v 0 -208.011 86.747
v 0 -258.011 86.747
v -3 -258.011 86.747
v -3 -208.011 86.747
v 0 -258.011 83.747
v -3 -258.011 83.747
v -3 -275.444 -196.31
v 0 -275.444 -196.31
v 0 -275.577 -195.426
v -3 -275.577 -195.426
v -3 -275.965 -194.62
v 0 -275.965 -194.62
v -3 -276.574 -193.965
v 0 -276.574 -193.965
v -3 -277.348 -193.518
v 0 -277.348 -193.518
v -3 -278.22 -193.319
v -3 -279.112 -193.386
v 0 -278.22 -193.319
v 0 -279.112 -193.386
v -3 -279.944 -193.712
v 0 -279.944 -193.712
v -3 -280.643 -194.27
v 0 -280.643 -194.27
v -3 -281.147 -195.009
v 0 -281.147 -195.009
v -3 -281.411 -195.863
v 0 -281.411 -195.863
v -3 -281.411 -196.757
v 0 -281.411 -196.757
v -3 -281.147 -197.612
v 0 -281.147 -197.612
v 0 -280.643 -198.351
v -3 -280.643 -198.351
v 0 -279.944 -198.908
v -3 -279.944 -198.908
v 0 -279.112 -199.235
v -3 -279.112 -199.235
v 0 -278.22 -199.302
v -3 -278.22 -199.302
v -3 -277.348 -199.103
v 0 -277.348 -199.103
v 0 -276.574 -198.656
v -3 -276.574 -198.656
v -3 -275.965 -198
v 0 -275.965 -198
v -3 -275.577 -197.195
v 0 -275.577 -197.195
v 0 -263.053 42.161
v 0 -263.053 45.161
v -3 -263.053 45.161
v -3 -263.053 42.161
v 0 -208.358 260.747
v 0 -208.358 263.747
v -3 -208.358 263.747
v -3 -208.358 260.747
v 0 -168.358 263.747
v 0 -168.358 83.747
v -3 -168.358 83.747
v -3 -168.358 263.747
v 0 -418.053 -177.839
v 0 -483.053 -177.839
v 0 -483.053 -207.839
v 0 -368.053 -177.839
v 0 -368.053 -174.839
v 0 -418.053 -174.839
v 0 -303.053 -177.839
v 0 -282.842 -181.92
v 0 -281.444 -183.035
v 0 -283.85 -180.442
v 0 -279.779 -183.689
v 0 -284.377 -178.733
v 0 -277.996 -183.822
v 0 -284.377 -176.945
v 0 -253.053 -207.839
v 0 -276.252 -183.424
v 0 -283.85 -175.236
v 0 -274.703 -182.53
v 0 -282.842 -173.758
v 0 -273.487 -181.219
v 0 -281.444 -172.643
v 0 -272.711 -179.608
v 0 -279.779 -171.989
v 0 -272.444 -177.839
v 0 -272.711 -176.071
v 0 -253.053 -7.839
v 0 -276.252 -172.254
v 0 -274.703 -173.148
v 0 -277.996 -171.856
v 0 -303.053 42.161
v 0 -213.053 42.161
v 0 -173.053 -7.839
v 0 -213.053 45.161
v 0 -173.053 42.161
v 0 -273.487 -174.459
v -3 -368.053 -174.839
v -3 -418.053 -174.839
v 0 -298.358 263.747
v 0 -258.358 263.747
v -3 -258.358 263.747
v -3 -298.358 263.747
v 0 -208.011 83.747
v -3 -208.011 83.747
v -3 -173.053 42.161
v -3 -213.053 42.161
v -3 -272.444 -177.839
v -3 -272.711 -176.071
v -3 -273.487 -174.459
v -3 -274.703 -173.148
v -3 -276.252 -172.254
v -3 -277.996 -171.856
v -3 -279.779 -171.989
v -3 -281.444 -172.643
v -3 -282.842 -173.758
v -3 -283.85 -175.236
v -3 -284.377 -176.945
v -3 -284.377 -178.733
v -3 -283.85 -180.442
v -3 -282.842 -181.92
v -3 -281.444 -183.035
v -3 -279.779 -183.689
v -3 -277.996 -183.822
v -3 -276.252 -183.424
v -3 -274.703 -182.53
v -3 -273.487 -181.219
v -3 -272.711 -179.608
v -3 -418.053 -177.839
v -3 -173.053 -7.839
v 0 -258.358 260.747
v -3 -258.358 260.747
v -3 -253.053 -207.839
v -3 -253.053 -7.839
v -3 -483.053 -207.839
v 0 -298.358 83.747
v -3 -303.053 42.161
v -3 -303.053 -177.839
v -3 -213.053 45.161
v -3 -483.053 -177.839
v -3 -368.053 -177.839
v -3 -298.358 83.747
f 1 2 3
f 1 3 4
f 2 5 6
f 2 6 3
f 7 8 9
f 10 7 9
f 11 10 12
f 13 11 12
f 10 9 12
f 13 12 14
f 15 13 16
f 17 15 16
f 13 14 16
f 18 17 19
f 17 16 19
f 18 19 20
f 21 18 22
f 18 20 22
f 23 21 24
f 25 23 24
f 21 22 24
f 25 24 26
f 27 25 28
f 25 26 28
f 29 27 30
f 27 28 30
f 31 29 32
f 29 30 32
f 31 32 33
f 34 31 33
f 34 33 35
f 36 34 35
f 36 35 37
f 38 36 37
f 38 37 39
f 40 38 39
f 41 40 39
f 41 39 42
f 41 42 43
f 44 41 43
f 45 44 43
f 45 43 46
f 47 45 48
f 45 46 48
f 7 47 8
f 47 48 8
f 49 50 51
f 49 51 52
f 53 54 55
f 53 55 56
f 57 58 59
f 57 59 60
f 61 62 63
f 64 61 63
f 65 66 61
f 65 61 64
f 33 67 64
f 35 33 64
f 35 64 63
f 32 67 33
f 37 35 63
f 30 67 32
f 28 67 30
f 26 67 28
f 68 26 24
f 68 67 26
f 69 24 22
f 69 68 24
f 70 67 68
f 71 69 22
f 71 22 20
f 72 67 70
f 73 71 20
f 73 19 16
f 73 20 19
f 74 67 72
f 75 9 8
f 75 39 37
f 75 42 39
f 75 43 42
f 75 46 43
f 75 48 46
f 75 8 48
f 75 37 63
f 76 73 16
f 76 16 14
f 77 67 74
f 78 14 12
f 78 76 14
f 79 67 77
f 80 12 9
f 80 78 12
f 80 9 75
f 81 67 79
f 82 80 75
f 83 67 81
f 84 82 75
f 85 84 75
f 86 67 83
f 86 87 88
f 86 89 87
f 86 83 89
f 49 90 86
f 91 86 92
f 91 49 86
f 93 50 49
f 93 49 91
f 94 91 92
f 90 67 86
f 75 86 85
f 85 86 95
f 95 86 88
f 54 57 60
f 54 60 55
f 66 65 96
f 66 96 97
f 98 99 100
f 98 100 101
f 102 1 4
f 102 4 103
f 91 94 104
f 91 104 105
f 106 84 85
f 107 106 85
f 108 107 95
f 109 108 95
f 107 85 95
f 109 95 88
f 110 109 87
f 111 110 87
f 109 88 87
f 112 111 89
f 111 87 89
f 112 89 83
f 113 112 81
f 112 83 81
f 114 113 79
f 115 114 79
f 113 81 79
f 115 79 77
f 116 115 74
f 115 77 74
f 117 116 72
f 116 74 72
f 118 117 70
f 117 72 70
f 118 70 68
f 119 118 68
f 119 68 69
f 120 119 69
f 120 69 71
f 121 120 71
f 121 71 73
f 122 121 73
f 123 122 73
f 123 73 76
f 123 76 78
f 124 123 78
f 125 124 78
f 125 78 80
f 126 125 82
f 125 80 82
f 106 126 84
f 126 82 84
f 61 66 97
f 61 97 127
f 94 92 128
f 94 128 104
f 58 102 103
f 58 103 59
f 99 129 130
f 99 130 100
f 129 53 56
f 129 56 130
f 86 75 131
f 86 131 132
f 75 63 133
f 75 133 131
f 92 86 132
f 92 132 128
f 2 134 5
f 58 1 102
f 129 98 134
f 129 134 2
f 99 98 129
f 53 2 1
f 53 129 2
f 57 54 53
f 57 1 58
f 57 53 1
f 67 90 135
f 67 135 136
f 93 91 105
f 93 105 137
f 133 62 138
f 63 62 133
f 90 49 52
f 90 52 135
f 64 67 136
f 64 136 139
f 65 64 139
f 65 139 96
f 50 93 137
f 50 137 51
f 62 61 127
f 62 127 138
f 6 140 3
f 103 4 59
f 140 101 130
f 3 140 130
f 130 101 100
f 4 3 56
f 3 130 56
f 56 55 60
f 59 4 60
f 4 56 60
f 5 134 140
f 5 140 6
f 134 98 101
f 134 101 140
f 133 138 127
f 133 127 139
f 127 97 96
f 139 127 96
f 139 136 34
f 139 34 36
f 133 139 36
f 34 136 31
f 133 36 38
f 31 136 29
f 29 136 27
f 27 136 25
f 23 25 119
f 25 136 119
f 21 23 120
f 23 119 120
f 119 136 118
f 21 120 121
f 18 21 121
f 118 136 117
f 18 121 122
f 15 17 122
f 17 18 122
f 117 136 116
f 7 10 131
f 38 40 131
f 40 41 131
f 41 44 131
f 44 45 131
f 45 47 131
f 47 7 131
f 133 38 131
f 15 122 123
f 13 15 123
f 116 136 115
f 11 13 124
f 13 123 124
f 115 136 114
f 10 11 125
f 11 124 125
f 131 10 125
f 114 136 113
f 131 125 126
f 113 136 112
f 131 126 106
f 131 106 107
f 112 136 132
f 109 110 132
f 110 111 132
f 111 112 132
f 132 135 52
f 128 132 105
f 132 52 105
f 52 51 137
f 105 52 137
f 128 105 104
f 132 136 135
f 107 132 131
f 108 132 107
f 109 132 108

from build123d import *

# Parameters (mm, degrees)
F0_R     = 3
F0_R_2   = 6
F1_DEPTH = 3


with BuildPart() as f1:
    # F0 (on Right) → F1 (new body)
    with BuildSketch(Plane.YZ):
        Polygon((-263.0525815487, 42.160961777), (-298.0525815487, 42.160961777), (-303.0525815487, 42.160961777), (-303.0525815487, 37.160961777), (-303.0525815487, -177.839038223), (-368.0525815487, -177.839038223), (-368.0525815487, -174.839038223), (-418.0525815487, -174.839038223), (-418.0525815487, -177.839038223), (-483.0525815487, -177.839038223), (-483.0525815487, -207.839038223), (-253.0525815487, -207.839038223), (-253.0525815487, -12.839038223), (-253.0525815487, -7.839038223), (-248.0525815487, -7.839038223), (-178.0525815487, -7.839038223), (-173.0525815487, -7.839038223), (-173.0525815487, -2.839038223), (-173.0525815487, 37.160961777), (-173.0525815487, 42.160961777), (-178.0525815487, 42.160961777), (-213.0525815487, 42.160961777), (-213.0525815487, 45.160961777), (-263.0525815487, 45.160961777), align=None)
        with Locations((-278.4440219402, -196.3103711605)):
            Circle(F0_R, mode=Mode.SUBTRACT)
        with Locations((-278.4440219402, -177.839038223)):
            Circle(F0_R_2, mode=Mode.SUBTRACT)
    extrude(amount=-F1_DEPTH)


with BuildPart() as f1b:
    # F0 (on Right) → F1, piece 2 (new body)
    with BuildSketch(Plane.YZ):
        Polygon((-298.3582913876, 263.7473198771), (-298.3582913876, 83.7473198771), (-258.0111324787, 83.7473198771), (-258.0111324787, 86.7473198771), (-208.0111324787, 86.7473198771), (-208.0111324787, 83.7473198771), (-168.3582913876, 83.7473198771), (-168.3582913876, 263.7473198771), (-208.3582913876, 263.7473198771), (-208.3582913876, 260.7473198771), (-258.3582913876, 260.7473198771), (-258.3582913876, 263.7473198771), align=None)
    extrude(amount=-F1_DEPTH)


solid = Compound([f1.part, f1b.part])
